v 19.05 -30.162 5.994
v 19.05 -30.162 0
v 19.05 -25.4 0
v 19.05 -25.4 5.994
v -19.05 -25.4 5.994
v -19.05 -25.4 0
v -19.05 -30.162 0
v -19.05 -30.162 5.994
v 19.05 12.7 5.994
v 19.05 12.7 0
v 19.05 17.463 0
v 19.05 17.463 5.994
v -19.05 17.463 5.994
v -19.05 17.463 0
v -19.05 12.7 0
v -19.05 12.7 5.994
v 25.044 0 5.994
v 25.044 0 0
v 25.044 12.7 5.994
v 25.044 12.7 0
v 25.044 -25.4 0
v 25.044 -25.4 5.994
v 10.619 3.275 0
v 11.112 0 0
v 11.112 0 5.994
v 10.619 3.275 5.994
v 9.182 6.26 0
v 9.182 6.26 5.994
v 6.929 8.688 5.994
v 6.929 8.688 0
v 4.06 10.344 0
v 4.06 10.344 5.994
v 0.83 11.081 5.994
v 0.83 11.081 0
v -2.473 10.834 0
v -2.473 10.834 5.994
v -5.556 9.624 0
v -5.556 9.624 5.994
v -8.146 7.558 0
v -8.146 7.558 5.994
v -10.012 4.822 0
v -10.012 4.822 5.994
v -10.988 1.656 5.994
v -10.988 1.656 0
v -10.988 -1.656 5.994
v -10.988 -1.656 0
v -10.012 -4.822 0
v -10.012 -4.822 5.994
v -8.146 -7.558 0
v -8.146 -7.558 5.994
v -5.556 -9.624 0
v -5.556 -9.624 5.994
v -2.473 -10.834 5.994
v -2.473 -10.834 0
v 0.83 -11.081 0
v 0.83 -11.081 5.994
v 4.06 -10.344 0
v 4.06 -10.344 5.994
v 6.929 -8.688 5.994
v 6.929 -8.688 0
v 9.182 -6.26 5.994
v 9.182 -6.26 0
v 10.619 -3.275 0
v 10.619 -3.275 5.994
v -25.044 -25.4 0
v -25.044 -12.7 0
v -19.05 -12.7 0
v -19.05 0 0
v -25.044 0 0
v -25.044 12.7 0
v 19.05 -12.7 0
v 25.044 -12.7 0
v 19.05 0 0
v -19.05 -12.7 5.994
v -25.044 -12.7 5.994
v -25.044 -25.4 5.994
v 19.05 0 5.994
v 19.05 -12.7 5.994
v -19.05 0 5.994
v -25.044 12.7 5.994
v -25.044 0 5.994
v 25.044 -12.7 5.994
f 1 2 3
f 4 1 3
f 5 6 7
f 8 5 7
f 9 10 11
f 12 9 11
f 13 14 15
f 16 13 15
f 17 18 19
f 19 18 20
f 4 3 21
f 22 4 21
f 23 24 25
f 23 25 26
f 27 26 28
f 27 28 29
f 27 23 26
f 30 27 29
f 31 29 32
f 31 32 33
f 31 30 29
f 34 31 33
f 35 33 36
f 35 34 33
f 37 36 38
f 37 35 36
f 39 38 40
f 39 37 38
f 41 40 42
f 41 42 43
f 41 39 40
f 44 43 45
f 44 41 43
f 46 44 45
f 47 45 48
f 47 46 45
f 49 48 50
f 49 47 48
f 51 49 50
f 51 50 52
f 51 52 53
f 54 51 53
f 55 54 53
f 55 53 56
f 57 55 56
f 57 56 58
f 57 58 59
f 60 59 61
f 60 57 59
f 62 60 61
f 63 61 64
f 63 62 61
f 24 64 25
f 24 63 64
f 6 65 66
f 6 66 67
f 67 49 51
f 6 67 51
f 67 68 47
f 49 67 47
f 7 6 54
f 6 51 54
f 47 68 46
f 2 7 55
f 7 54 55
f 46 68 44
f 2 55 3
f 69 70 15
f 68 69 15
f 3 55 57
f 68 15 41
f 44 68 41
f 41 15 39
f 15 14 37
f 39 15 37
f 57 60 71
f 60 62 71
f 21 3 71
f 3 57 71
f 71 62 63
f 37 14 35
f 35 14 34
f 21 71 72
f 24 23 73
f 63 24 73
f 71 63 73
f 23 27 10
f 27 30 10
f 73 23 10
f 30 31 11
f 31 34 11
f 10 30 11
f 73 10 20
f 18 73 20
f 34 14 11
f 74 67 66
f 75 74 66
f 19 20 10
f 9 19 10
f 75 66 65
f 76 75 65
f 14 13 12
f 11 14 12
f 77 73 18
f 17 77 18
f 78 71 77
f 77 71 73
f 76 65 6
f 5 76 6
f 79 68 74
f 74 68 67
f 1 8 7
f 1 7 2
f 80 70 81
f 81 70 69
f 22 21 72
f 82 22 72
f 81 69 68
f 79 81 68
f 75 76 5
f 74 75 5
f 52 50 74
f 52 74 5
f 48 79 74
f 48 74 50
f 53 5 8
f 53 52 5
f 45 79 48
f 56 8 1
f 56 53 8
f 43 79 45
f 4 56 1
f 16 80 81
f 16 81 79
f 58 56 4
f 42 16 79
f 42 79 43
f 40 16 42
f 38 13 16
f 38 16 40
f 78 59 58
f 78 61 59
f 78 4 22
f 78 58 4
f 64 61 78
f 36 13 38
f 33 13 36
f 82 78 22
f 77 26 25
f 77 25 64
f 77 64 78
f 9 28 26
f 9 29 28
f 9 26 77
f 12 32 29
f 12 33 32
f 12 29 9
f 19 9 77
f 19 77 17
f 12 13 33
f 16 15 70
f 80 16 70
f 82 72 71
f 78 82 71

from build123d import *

# Parameters (mm, degrees)
SKETCH1_R           = 11.1125
BOSS_EXTRUDE1_DEPTH = 5.9944
SKETCH2_W           = 38.1
SKETCH2_H           = 1.5875
CUT_EXTRUDE1_DEPTH  = 6.9944


with BuildPart() as part:
    # Sketch1 → Boss-Extrude1 (new body)
    with BuildSketch(Plane.XY):
        Polygon((19.05, 19.05), (-19.05, 19.05), (-19.05, 12.7), (-25.0444, 12.7), (-25.0444, 0), (-19.05, 0), (-19.05, -12.7), (-25.0444, -12.7), (-25.0444, -25.4), (-19.05, -25.4), (-19.05, -31.75), (19.05, -31.75), (19.05, -25.4), (25.0444, -25.4), (25.0444, -12.7), (19.05, -12.7), (19.05, 0), (25.0444, 0), (25.0444, 12.7), (19.05, 12.7), align=None)
        Circle(SKETCH1_R, mode=Mode.SUBTRACT)
    extrude(amount=BOSS_EXTRUDE1_DEPTH)

    # Sketch2 → Cut-Extrude1 (cut, through all)
    with BuildSketch(Plane.XY.offset(5.9944)):
        with Locations((0, -30.95625)):
            Rectangle(SKETCH2_W, SKETCH2_H)
        with Locations((0, 18.25625)):
            Rectangle(SKETCH2_W, SKETCH2_H)
    extrude(amount=-CUT_EXTRUDE1_DEPTH, mode=Mode.SUBTRACT)


solid = part.part
